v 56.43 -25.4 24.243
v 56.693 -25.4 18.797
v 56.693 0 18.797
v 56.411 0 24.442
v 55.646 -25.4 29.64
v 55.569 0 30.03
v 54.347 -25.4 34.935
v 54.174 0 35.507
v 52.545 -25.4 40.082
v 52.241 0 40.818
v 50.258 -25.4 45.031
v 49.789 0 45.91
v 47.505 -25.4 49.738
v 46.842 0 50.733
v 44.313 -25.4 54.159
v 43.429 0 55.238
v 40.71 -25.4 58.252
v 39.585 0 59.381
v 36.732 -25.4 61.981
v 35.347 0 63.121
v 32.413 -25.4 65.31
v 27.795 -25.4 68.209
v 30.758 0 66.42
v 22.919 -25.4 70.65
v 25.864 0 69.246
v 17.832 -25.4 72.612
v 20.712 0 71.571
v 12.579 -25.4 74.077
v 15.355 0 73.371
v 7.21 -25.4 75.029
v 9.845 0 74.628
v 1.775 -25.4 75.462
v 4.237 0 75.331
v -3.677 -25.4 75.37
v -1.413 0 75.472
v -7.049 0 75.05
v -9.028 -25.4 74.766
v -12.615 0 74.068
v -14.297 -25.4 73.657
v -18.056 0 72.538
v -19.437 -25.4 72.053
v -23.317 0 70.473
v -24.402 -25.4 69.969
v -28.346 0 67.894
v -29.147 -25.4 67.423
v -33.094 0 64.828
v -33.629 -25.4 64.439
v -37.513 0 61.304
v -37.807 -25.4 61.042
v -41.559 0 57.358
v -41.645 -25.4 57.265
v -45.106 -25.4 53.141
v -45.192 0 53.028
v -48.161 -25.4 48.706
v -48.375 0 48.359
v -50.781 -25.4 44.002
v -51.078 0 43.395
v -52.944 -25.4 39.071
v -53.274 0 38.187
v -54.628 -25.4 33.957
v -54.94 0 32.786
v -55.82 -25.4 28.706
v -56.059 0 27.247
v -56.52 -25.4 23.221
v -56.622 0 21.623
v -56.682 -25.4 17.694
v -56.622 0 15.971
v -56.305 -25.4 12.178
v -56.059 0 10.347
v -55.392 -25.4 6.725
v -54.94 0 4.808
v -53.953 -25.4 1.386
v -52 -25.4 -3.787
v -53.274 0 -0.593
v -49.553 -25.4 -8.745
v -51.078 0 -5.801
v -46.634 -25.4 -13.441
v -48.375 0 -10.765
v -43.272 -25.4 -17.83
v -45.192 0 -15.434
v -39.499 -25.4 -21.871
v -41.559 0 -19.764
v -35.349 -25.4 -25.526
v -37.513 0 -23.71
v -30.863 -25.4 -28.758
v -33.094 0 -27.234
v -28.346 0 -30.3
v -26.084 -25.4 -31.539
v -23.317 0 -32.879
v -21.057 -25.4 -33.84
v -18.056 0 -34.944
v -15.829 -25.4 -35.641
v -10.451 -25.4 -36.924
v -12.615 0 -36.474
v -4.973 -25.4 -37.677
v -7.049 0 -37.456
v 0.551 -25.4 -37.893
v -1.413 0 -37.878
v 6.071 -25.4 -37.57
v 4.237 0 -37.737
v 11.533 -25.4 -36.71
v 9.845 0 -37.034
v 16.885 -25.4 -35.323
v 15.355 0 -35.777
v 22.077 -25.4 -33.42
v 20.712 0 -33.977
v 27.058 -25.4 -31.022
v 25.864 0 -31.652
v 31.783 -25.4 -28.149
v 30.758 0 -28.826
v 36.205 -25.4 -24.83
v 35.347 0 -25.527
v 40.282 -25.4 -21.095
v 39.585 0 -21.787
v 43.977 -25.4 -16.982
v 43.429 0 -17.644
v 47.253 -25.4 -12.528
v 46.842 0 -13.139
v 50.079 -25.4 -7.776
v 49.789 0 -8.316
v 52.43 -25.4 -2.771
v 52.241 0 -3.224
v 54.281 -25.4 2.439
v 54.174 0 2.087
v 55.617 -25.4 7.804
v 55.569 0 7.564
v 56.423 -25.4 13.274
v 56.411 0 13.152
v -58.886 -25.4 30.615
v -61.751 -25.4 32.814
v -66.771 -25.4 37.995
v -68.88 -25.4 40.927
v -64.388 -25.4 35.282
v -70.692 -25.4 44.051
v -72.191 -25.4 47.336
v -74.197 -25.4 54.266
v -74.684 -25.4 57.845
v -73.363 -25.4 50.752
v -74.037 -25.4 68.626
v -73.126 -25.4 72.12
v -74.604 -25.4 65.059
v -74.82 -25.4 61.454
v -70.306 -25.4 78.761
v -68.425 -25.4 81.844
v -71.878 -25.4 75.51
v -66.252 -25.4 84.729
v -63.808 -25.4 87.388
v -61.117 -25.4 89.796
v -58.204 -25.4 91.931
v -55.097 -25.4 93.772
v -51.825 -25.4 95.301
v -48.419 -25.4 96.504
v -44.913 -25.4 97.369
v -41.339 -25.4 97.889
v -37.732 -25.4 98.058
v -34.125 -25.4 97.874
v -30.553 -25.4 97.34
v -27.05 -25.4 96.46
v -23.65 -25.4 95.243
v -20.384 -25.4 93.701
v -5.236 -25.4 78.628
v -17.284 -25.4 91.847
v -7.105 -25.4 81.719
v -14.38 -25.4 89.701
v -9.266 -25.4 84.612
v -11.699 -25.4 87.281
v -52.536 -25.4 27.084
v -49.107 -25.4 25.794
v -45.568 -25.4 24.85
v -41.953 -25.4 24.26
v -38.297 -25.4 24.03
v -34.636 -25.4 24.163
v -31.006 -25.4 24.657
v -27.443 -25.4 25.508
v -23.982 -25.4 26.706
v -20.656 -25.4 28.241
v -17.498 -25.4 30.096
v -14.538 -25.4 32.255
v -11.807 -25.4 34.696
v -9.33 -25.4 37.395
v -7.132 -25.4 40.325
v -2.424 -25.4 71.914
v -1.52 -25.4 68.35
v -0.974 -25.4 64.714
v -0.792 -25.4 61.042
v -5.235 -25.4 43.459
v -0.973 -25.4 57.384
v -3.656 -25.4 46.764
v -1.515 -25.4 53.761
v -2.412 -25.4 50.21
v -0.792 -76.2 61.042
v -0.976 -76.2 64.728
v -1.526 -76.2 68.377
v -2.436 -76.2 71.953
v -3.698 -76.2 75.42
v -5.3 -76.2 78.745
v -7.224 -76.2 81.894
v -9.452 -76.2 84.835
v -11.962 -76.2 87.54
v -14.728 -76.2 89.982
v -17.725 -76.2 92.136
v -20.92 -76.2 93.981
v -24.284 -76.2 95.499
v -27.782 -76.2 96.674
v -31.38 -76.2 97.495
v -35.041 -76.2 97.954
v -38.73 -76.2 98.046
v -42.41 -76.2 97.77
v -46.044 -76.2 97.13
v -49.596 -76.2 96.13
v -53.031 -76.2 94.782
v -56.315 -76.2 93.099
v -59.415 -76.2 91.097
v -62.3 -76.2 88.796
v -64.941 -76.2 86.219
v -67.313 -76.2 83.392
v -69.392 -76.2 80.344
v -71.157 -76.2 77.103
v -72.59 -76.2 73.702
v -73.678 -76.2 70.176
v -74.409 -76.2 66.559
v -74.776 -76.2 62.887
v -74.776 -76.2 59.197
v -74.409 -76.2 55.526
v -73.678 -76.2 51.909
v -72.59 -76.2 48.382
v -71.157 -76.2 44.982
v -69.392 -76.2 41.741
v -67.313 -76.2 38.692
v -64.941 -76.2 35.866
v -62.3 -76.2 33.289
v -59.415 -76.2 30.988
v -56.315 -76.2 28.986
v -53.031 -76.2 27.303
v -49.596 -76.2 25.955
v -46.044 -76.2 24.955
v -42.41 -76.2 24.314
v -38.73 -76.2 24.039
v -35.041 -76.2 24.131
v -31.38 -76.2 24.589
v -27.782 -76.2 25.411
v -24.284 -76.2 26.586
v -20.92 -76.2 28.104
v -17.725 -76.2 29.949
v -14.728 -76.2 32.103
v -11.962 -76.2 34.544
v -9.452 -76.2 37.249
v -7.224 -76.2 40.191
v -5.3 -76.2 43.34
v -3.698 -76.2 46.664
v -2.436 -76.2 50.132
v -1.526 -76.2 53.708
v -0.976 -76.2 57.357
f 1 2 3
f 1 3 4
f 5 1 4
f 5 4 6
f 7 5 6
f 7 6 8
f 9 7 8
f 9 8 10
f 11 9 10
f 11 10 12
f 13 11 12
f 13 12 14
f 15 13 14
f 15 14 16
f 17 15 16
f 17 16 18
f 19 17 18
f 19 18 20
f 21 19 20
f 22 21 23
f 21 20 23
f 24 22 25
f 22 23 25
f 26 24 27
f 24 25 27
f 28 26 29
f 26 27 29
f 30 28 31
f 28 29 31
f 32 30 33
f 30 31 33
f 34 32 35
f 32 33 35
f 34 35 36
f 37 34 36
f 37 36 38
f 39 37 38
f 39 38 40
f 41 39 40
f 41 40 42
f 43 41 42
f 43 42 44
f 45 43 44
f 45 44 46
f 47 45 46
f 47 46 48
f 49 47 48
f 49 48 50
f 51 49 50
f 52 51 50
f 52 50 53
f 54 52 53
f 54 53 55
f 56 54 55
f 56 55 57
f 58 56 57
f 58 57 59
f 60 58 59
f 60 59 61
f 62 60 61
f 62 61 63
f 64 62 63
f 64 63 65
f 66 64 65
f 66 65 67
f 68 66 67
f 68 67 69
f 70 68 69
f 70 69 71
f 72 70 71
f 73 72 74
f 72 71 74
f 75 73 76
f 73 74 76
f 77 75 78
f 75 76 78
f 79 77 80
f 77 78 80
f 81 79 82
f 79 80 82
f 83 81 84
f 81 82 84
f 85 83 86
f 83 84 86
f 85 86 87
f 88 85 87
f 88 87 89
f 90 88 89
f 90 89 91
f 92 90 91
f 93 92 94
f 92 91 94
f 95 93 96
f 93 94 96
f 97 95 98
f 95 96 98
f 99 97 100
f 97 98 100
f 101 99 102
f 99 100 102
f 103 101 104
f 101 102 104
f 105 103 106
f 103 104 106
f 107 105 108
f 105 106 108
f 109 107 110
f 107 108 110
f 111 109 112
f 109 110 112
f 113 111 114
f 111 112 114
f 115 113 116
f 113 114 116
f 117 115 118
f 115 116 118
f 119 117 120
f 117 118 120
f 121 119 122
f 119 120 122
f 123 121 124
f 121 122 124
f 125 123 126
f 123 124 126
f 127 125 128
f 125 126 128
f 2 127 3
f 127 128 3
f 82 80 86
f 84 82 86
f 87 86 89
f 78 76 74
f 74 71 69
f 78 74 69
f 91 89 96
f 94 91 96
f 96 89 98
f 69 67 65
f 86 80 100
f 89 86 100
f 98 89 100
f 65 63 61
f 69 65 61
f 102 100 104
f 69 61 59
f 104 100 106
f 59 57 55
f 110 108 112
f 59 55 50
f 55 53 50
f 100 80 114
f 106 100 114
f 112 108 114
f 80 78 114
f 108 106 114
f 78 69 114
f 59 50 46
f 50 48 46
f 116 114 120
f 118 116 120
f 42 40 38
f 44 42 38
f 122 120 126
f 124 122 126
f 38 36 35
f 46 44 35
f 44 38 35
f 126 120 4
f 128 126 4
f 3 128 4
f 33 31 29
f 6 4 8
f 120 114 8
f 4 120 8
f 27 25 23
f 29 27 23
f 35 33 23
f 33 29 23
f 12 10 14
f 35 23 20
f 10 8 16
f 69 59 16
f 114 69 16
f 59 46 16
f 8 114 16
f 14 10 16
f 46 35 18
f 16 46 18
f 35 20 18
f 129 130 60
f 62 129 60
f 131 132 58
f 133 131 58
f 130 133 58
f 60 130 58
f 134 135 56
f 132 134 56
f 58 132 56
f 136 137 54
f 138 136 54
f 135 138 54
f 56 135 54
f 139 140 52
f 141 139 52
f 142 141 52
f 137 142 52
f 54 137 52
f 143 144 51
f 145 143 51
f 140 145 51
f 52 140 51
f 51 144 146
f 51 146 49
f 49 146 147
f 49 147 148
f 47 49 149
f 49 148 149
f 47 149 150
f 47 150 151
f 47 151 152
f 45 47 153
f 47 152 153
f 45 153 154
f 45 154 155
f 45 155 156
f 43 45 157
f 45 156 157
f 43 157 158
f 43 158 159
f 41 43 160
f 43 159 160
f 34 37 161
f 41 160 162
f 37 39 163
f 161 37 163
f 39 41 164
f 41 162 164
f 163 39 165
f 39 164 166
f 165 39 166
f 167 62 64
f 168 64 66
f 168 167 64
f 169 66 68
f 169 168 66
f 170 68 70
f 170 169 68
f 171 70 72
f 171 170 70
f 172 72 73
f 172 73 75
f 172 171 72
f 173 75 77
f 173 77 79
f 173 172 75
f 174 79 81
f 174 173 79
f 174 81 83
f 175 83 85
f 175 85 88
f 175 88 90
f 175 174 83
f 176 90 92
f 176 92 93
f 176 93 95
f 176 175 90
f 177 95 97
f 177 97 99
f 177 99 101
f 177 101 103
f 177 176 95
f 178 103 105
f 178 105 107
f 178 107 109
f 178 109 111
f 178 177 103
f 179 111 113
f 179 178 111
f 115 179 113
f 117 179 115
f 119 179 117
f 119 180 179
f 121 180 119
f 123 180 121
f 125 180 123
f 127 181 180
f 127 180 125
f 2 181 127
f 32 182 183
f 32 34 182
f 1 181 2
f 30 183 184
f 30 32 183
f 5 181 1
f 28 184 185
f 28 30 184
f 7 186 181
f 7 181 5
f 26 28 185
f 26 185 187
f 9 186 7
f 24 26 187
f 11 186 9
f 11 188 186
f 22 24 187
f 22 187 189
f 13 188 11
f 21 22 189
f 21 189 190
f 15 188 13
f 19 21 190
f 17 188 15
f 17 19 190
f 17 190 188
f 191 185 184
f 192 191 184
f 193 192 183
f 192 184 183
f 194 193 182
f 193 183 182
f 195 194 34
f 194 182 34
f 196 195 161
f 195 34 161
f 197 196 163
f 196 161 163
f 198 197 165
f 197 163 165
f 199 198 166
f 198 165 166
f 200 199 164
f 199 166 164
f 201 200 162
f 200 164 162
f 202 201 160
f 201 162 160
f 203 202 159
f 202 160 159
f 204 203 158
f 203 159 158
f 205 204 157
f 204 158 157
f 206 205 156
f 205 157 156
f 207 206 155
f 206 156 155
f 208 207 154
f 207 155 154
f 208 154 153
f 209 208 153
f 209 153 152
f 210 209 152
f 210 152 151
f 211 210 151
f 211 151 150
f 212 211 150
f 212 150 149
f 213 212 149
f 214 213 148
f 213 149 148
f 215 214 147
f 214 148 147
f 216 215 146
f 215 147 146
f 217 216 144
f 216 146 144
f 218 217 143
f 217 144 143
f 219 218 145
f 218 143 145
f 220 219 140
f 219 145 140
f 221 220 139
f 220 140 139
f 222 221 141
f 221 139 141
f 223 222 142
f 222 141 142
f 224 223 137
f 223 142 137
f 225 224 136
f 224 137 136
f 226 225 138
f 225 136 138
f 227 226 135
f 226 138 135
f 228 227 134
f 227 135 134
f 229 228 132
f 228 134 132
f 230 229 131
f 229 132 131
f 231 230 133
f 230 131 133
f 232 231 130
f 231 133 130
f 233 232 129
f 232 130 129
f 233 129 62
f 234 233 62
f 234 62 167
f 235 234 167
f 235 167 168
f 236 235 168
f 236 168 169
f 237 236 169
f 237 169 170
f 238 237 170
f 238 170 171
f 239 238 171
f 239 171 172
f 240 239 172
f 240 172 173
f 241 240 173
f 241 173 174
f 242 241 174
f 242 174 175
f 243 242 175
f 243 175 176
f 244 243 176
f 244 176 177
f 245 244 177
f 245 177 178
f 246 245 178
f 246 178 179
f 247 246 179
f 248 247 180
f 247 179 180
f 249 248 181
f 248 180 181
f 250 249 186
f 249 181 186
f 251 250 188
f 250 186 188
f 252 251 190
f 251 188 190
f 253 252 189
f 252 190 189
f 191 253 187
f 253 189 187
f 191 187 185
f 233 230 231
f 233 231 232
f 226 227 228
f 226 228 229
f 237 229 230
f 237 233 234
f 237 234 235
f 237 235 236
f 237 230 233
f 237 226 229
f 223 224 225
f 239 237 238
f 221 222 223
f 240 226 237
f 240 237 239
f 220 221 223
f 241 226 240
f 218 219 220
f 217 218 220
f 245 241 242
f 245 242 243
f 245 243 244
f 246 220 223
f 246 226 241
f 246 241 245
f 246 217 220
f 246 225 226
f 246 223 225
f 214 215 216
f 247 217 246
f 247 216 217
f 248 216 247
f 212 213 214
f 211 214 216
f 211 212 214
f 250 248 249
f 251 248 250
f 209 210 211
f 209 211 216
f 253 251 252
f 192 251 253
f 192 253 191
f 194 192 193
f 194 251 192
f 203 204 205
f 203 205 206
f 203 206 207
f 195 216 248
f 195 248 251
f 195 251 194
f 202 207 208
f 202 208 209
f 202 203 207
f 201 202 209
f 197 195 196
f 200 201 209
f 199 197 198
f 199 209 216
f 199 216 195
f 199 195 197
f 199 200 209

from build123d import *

# Parameters (mm, degrees)
F1_R      = 56.692647
F2_DEPTH  = 25.4
F3_R      = 37.015335
F4_DEPTH  = 25.4
F4_FACE_R = 37.015335
F5_DEPTH  = 25.4
F6_R      = 26.874767
F7_DEPTH  = 25.4


with BuildPart() as f2:
    # F1 (on face) → F2 (new body)
    with BuildSketch(Plane.XZ):
        with Locations((0, 18.79701)):
            Circle(F1_R)
    extrude(amount=F2_DEPTH)

    # F3 (on face) → F4 (join)
    with BuildSketch(Plane.XZ.offset(25.4)):
        with Locations((-37.807173, 61.042411)):
            Circle(F3_R)
    extrude(amount=F4_DEPTH)

    # F4_face (on face) → F5 (join)
    with BuildSketch(Plane(origin=(-37.807173, -50.8, 61.042411), x_dir=(1, 0, 0), z_dir=(0, -1, 0))):
        Circle(F4_FACE_R)
    extrude(amount=F5_DEPTH)

    # F6 (on face) → F7 (join)
    with BuildSketch(Plane.XZ):
        with Locations((0, 20.070814)):
            Circle(F6_R)
    extrude(amount=F7_DEPTH)


solid = f2.part
